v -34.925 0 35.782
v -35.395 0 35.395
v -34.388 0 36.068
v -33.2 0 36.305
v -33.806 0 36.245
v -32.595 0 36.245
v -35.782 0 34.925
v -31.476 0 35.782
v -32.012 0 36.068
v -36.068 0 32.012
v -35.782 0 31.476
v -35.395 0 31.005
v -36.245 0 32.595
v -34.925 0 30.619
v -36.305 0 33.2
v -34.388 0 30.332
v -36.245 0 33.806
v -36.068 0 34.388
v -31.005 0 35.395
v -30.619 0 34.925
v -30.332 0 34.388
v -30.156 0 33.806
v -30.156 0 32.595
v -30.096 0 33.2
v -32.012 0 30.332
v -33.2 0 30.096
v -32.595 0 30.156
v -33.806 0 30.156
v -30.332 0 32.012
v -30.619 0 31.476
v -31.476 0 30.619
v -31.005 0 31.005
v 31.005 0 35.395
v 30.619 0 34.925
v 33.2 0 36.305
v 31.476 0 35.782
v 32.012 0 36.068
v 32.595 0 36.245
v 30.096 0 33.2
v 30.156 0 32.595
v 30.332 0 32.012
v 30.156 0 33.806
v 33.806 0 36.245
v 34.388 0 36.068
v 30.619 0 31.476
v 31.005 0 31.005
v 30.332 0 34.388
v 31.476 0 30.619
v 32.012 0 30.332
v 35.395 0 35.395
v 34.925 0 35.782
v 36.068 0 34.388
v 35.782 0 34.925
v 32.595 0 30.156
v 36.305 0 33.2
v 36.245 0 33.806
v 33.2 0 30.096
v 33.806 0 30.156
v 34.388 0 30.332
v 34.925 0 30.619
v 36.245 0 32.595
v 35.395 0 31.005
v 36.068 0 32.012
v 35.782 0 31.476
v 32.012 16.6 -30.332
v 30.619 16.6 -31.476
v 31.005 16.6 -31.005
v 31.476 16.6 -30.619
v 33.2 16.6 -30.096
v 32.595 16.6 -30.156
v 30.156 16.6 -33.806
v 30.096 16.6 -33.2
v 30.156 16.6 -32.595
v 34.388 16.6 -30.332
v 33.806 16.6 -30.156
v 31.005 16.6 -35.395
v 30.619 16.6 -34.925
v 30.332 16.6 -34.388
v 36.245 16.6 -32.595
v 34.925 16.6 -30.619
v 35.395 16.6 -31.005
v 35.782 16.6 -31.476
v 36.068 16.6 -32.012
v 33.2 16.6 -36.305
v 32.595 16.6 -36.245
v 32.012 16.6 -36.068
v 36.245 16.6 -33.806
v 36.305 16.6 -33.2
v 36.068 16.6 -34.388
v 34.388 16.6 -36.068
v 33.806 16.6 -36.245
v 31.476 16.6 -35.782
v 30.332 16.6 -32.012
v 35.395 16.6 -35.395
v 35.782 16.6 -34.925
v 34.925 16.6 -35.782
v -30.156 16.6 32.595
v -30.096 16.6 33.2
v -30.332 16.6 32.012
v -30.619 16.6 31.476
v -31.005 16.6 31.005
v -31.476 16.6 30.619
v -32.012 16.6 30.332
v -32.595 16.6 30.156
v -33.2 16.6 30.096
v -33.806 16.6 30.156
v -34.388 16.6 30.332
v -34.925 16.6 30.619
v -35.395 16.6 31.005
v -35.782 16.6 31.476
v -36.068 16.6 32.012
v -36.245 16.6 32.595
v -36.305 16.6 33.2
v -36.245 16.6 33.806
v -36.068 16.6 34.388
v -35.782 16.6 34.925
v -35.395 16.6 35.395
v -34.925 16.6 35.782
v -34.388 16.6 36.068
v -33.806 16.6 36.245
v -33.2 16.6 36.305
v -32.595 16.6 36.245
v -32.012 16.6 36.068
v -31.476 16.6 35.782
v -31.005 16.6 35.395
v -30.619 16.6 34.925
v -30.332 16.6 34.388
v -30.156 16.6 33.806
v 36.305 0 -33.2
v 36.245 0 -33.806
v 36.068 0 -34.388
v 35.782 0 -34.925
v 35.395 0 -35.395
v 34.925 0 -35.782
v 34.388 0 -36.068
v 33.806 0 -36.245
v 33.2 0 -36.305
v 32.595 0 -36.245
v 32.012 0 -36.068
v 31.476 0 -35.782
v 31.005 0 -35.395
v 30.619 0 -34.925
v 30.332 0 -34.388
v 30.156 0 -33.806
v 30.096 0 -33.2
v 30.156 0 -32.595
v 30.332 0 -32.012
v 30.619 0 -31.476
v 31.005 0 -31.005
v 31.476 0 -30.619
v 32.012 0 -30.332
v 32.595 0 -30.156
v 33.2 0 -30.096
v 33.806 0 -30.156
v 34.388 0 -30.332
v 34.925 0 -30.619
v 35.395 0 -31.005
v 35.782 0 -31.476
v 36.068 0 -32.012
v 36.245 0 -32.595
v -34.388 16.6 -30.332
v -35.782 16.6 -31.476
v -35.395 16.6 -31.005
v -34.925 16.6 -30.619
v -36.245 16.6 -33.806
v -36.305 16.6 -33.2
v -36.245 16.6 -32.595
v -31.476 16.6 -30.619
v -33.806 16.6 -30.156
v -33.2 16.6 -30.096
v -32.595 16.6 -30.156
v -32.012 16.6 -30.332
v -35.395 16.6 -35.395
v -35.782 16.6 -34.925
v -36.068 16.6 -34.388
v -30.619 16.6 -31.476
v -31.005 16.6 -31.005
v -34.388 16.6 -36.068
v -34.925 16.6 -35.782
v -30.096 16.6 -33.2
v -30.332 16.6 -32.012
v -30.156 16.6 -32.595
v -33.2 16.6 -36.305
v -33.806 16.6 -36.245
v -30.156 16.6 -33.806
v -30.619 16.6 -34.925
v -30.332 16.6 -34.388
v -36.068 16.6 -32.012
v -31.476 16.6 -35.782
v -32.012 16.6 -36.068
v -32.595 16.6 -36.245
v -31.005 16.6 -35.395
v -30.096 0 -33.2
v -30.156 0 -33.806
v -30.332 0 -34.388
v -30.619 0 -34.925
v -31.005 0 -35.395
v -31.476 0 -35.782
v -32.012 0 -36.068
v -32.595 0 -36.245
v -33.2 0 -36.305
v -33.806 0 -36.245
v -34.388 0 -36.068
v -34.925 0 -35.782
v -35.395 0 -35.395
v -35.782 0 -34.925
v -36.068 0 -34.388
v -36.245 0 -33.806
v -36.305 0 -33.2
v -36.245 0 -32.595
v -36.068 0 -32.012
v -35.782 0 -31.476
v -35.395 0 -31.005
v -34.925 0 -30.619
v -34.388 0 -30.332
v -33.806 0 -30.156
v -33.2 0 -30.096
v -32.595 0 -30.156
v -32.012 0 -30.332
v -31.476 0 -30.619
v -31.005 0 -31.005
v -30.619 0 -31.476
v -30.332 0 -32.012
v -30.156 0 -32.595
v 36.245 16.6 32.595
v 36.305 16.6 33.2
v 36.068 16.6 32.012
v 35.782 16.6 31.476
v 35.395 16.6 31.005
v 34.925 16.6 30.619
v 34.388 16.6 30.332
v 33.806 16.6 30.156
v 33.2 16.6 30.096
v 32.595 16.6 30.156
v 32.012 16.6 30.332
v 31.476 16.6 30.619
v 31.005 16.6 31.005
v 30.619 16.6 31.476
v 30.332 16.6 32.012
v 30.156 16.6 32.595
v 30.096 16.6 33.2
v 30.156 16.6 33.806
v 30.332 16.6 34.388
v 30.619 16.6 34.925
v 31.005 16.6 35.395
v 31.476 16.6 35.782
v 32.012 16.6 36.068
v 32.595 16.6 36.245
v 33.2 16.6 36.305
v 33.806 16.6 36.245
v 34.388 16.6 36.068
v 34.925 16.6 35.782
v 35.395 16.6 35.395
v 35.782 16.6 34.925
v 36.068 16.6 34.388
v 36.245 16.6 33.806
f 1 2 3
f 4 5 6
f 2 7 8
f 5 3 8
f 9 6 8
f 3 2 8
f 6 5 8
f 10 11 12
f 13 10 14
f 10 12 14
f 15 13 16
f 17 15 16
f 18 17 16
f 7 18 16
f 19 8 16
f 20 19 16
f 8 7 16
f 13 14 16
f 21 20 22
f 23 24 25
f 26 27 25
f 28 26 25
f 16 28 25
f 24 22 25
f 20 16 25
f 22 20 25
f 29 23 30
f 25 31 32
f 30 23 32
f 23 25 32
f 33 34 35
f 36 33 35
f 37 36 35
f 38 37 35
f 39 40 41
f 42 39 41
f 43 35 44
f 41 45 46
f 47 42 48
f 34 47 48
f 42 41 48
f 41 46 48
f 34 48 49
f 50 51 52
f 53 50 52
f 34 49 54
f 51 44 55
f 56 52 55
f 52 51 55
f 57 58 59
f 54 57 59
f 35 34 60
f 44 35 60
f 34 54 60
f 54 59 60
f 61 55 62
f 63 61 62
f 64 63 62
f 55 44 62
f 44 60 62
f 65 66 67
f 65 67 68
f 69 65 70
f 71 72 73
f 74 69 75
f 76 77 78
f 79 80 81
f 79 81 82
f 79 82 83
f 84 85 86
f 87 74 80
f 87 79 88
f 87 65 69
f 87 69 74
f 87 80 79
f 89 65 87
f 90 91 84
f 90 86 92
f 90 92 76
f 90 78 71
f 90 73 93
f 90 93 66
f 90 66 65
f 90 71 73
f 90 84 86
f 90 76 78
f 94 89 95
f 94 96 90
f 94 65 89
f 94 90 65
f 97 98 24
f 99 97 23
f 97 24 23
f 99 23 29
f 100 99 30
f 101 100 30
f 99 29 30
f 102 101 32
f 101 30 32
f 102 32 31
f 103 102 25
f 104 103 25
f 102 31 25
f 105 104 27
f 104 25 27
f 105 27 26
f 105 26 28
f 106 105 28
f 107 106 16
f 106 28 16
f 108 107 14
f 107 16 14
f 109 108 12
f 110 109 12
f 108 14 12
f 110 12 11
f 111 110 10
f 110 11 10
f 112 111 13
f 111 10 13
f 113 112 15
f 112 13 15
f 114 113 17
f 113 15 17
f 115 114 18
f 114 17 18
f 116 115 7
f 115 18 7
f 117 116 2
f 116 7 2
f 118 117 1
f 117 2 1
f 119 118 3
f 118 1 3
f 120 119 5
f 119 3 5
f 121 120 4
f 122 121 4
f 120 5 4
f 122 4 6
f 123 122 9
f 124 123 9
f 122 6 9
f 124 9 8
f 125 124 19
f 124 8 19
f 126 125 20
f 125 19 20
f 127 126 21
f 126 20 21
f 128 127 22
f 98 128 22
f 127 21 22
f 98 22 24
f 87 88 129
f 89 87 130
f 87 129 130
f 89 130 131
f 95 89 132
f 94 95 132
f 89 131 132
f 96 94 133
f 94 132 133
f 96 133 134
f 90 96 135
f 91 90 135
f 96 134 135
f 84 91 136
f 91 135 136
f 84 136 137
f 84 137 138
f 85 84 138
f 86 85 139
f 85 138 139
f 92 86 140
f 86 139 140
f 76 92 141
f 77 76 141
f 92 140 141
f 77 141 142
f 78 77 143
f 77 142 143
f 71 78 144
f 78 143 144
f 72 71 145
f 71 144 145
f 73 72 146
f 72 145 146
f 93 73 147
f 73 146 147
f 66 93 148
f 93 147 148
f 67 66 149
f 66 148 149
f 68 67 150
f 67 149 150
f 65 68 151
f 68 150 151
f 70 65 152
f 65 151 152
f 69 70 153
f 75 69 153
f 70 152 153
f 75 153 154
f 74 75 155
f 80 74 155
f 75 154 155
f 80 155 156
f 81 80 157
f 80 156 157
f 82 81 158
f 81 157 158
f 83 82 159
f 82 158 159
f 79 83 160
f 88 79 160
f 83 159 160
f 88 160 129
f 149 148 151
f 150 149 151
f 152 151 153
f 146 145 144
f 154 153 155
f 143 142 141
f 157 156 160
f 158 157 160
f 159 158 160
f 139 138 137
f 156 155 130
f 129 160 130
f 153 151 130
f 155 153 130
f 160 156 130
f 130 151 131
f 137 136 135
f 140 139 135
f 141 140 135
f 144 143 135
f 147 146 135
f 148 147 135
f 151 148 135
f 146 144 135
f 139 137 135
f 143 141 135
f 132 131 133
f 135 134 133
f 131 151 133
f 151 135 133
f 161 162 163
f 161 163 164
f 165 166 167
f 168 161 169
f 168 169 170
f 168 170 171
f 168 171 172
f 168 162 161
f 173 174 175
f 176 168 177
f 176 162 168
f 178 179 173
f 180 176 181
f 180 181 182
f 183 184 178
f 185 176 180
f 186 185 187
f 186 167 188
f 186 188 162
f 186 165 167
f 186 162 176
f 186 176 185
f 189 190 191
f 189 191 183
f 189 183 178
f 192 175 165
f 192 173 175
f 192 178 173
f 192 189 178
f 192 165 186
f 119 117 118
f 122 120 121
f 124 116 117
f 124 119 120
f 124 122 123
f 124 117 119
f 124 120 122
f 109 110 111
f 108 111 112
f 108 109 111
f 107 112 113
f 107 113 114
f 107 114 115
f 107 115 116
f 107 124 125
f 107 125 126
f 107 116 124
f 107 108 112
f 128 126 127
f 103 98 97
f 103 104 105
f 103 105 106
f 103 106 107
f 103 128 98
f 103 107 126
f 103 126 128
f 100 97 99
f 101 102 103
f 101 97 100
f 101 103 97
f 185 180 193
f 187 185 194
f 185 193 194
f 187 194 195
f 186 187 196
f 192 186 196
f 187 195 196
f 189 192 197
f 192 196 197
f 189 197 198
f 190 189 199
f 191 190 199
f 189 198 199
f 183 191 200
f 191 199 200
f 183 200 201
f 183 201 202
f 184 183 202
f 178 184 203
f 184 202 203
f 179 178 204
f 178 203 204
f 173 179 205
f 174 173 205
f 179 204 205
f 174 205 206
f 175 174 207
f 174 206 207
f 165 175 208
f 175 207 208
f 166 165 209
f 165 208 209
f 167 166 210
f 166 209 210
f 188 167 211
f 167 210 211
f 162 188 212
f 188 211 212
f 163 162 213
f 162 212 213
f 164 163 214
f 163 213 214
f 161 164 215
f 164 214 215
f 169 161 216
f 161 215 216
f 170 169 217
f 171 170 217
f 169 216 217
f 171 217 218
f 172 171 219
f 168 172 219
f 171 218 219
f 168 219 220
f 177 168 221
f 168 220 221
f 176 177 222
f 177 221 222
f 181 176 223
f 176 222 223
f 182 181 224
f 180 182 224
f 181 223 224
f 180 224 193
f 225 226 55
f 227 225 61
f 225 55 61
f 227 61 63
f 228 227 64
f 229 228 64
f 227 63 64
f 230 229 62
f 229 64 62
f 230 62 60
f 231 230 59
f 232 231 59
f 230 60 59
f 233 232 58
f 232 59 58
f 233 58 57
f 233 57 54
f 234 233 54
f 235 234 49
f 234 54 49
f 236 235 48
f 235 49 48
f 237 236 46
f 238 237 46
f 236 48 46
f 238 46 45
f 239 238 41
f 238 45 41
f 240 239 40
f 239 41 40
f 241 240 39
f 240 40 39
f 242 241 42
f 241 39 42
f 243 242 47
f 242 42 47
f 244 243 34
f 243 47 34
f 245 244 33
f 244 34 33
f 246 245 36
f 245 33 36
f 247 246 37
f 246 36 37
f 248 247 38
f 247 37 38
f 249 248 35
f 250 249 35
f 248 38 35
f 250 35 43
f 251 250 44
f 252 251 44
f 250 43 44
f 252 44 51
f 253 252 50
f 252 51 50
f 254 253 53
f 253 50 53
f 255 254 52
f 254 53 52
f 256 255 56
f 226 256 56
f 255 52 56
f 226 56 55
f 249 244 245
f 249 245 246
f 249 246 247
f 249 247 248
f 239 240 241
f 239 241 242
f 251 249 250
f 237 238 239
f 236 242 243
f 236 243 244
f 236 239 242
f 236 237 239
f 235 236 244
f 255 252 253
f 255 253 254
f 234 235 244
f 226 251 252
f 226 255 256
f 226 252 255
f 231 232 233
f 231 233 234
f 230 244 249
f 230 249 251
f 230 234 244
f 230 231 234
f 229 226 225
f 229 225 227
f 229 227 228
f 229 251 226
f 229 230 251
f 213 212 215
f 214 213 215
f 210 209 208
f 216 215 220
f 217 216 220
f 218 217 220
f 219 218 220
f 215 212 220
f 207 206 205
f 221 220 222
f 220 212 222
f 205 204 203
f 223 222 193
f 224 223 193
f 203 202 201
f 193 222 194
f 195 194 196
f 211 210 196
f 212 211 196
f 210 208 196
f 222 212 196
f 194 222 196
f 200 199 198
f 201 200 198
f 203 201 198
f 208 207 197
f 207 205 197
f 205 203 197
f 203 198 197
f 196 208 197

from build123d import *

# Parameters (mm, degrees)
SKETCH1_R             = 3.104394748
BOSS_EXTRUDE1_DEPTH   = 16.6
BOSS_EXTRUDE1_2_DEPTH = 16.6
BOSS_EXTRUDE1_3_DEPTH = 16.6
BOSS_EXTRUDE1_4_DEPTH = 16.6


with BuildPart() as part:
    # Sketch1 → Boss-Extrude1 (new body)
    with BuildSketch(Plane(origin=(0, 0, 0), x_dir=(1, 0, 0), z_dir=(0, 1, 0))):
        with Locations((-33.200350973, 33.200350973)):
            Circle(SKETCH1_R)
    extrude(amount=BOSS_EXTRUDE1_DEPTH)


with BuildPart() as body_2:
    # Sketch1 → Boss-Extrude1 2 (new body)
    with BuildSketch(Plane(origin=(0, 0, 0), x_dir=(1, 0, 0), z_dir=(0, 1, 0))):
        with Locations((33.200350973, 33.200350973)):
            Circle(SKETCH1_R)
    extrude(amount=BOSS_EXTRUDE1_2_DEPTH)


with BuildPart() as body_3:
    # Sketch1 → Boss-Extrude1 3 (new body)
    with BuildSketch(Plane(origin=(0, 0, 0), x_dir=(1, 0, 0), z_dir=(0, 1, 0))):
        with Locations((33.200350973, -33.200350973)):
            Circle(SKETCH1_R)
    extrude(amount=BOSS_EXTRUDE1_3_DEPTH)


with BuildPart() as body_4:
    # Sketch1 → Boss-Extrude1 4 (new body)
    with BuildSketch(Plane(origin=(0, 0, 0), x_dir=(1, 0, 0), z_dir=(0, 1, 0))):
        with Locations((-33.200350973, -33.200350973)):
            Circle(SKETCH1_R)
    extrude(amount=BOSS_EXTRUDE1_4_DEPTH)


solid = Compound([part.part, body_2.part, body_3.part, body_4.part])
